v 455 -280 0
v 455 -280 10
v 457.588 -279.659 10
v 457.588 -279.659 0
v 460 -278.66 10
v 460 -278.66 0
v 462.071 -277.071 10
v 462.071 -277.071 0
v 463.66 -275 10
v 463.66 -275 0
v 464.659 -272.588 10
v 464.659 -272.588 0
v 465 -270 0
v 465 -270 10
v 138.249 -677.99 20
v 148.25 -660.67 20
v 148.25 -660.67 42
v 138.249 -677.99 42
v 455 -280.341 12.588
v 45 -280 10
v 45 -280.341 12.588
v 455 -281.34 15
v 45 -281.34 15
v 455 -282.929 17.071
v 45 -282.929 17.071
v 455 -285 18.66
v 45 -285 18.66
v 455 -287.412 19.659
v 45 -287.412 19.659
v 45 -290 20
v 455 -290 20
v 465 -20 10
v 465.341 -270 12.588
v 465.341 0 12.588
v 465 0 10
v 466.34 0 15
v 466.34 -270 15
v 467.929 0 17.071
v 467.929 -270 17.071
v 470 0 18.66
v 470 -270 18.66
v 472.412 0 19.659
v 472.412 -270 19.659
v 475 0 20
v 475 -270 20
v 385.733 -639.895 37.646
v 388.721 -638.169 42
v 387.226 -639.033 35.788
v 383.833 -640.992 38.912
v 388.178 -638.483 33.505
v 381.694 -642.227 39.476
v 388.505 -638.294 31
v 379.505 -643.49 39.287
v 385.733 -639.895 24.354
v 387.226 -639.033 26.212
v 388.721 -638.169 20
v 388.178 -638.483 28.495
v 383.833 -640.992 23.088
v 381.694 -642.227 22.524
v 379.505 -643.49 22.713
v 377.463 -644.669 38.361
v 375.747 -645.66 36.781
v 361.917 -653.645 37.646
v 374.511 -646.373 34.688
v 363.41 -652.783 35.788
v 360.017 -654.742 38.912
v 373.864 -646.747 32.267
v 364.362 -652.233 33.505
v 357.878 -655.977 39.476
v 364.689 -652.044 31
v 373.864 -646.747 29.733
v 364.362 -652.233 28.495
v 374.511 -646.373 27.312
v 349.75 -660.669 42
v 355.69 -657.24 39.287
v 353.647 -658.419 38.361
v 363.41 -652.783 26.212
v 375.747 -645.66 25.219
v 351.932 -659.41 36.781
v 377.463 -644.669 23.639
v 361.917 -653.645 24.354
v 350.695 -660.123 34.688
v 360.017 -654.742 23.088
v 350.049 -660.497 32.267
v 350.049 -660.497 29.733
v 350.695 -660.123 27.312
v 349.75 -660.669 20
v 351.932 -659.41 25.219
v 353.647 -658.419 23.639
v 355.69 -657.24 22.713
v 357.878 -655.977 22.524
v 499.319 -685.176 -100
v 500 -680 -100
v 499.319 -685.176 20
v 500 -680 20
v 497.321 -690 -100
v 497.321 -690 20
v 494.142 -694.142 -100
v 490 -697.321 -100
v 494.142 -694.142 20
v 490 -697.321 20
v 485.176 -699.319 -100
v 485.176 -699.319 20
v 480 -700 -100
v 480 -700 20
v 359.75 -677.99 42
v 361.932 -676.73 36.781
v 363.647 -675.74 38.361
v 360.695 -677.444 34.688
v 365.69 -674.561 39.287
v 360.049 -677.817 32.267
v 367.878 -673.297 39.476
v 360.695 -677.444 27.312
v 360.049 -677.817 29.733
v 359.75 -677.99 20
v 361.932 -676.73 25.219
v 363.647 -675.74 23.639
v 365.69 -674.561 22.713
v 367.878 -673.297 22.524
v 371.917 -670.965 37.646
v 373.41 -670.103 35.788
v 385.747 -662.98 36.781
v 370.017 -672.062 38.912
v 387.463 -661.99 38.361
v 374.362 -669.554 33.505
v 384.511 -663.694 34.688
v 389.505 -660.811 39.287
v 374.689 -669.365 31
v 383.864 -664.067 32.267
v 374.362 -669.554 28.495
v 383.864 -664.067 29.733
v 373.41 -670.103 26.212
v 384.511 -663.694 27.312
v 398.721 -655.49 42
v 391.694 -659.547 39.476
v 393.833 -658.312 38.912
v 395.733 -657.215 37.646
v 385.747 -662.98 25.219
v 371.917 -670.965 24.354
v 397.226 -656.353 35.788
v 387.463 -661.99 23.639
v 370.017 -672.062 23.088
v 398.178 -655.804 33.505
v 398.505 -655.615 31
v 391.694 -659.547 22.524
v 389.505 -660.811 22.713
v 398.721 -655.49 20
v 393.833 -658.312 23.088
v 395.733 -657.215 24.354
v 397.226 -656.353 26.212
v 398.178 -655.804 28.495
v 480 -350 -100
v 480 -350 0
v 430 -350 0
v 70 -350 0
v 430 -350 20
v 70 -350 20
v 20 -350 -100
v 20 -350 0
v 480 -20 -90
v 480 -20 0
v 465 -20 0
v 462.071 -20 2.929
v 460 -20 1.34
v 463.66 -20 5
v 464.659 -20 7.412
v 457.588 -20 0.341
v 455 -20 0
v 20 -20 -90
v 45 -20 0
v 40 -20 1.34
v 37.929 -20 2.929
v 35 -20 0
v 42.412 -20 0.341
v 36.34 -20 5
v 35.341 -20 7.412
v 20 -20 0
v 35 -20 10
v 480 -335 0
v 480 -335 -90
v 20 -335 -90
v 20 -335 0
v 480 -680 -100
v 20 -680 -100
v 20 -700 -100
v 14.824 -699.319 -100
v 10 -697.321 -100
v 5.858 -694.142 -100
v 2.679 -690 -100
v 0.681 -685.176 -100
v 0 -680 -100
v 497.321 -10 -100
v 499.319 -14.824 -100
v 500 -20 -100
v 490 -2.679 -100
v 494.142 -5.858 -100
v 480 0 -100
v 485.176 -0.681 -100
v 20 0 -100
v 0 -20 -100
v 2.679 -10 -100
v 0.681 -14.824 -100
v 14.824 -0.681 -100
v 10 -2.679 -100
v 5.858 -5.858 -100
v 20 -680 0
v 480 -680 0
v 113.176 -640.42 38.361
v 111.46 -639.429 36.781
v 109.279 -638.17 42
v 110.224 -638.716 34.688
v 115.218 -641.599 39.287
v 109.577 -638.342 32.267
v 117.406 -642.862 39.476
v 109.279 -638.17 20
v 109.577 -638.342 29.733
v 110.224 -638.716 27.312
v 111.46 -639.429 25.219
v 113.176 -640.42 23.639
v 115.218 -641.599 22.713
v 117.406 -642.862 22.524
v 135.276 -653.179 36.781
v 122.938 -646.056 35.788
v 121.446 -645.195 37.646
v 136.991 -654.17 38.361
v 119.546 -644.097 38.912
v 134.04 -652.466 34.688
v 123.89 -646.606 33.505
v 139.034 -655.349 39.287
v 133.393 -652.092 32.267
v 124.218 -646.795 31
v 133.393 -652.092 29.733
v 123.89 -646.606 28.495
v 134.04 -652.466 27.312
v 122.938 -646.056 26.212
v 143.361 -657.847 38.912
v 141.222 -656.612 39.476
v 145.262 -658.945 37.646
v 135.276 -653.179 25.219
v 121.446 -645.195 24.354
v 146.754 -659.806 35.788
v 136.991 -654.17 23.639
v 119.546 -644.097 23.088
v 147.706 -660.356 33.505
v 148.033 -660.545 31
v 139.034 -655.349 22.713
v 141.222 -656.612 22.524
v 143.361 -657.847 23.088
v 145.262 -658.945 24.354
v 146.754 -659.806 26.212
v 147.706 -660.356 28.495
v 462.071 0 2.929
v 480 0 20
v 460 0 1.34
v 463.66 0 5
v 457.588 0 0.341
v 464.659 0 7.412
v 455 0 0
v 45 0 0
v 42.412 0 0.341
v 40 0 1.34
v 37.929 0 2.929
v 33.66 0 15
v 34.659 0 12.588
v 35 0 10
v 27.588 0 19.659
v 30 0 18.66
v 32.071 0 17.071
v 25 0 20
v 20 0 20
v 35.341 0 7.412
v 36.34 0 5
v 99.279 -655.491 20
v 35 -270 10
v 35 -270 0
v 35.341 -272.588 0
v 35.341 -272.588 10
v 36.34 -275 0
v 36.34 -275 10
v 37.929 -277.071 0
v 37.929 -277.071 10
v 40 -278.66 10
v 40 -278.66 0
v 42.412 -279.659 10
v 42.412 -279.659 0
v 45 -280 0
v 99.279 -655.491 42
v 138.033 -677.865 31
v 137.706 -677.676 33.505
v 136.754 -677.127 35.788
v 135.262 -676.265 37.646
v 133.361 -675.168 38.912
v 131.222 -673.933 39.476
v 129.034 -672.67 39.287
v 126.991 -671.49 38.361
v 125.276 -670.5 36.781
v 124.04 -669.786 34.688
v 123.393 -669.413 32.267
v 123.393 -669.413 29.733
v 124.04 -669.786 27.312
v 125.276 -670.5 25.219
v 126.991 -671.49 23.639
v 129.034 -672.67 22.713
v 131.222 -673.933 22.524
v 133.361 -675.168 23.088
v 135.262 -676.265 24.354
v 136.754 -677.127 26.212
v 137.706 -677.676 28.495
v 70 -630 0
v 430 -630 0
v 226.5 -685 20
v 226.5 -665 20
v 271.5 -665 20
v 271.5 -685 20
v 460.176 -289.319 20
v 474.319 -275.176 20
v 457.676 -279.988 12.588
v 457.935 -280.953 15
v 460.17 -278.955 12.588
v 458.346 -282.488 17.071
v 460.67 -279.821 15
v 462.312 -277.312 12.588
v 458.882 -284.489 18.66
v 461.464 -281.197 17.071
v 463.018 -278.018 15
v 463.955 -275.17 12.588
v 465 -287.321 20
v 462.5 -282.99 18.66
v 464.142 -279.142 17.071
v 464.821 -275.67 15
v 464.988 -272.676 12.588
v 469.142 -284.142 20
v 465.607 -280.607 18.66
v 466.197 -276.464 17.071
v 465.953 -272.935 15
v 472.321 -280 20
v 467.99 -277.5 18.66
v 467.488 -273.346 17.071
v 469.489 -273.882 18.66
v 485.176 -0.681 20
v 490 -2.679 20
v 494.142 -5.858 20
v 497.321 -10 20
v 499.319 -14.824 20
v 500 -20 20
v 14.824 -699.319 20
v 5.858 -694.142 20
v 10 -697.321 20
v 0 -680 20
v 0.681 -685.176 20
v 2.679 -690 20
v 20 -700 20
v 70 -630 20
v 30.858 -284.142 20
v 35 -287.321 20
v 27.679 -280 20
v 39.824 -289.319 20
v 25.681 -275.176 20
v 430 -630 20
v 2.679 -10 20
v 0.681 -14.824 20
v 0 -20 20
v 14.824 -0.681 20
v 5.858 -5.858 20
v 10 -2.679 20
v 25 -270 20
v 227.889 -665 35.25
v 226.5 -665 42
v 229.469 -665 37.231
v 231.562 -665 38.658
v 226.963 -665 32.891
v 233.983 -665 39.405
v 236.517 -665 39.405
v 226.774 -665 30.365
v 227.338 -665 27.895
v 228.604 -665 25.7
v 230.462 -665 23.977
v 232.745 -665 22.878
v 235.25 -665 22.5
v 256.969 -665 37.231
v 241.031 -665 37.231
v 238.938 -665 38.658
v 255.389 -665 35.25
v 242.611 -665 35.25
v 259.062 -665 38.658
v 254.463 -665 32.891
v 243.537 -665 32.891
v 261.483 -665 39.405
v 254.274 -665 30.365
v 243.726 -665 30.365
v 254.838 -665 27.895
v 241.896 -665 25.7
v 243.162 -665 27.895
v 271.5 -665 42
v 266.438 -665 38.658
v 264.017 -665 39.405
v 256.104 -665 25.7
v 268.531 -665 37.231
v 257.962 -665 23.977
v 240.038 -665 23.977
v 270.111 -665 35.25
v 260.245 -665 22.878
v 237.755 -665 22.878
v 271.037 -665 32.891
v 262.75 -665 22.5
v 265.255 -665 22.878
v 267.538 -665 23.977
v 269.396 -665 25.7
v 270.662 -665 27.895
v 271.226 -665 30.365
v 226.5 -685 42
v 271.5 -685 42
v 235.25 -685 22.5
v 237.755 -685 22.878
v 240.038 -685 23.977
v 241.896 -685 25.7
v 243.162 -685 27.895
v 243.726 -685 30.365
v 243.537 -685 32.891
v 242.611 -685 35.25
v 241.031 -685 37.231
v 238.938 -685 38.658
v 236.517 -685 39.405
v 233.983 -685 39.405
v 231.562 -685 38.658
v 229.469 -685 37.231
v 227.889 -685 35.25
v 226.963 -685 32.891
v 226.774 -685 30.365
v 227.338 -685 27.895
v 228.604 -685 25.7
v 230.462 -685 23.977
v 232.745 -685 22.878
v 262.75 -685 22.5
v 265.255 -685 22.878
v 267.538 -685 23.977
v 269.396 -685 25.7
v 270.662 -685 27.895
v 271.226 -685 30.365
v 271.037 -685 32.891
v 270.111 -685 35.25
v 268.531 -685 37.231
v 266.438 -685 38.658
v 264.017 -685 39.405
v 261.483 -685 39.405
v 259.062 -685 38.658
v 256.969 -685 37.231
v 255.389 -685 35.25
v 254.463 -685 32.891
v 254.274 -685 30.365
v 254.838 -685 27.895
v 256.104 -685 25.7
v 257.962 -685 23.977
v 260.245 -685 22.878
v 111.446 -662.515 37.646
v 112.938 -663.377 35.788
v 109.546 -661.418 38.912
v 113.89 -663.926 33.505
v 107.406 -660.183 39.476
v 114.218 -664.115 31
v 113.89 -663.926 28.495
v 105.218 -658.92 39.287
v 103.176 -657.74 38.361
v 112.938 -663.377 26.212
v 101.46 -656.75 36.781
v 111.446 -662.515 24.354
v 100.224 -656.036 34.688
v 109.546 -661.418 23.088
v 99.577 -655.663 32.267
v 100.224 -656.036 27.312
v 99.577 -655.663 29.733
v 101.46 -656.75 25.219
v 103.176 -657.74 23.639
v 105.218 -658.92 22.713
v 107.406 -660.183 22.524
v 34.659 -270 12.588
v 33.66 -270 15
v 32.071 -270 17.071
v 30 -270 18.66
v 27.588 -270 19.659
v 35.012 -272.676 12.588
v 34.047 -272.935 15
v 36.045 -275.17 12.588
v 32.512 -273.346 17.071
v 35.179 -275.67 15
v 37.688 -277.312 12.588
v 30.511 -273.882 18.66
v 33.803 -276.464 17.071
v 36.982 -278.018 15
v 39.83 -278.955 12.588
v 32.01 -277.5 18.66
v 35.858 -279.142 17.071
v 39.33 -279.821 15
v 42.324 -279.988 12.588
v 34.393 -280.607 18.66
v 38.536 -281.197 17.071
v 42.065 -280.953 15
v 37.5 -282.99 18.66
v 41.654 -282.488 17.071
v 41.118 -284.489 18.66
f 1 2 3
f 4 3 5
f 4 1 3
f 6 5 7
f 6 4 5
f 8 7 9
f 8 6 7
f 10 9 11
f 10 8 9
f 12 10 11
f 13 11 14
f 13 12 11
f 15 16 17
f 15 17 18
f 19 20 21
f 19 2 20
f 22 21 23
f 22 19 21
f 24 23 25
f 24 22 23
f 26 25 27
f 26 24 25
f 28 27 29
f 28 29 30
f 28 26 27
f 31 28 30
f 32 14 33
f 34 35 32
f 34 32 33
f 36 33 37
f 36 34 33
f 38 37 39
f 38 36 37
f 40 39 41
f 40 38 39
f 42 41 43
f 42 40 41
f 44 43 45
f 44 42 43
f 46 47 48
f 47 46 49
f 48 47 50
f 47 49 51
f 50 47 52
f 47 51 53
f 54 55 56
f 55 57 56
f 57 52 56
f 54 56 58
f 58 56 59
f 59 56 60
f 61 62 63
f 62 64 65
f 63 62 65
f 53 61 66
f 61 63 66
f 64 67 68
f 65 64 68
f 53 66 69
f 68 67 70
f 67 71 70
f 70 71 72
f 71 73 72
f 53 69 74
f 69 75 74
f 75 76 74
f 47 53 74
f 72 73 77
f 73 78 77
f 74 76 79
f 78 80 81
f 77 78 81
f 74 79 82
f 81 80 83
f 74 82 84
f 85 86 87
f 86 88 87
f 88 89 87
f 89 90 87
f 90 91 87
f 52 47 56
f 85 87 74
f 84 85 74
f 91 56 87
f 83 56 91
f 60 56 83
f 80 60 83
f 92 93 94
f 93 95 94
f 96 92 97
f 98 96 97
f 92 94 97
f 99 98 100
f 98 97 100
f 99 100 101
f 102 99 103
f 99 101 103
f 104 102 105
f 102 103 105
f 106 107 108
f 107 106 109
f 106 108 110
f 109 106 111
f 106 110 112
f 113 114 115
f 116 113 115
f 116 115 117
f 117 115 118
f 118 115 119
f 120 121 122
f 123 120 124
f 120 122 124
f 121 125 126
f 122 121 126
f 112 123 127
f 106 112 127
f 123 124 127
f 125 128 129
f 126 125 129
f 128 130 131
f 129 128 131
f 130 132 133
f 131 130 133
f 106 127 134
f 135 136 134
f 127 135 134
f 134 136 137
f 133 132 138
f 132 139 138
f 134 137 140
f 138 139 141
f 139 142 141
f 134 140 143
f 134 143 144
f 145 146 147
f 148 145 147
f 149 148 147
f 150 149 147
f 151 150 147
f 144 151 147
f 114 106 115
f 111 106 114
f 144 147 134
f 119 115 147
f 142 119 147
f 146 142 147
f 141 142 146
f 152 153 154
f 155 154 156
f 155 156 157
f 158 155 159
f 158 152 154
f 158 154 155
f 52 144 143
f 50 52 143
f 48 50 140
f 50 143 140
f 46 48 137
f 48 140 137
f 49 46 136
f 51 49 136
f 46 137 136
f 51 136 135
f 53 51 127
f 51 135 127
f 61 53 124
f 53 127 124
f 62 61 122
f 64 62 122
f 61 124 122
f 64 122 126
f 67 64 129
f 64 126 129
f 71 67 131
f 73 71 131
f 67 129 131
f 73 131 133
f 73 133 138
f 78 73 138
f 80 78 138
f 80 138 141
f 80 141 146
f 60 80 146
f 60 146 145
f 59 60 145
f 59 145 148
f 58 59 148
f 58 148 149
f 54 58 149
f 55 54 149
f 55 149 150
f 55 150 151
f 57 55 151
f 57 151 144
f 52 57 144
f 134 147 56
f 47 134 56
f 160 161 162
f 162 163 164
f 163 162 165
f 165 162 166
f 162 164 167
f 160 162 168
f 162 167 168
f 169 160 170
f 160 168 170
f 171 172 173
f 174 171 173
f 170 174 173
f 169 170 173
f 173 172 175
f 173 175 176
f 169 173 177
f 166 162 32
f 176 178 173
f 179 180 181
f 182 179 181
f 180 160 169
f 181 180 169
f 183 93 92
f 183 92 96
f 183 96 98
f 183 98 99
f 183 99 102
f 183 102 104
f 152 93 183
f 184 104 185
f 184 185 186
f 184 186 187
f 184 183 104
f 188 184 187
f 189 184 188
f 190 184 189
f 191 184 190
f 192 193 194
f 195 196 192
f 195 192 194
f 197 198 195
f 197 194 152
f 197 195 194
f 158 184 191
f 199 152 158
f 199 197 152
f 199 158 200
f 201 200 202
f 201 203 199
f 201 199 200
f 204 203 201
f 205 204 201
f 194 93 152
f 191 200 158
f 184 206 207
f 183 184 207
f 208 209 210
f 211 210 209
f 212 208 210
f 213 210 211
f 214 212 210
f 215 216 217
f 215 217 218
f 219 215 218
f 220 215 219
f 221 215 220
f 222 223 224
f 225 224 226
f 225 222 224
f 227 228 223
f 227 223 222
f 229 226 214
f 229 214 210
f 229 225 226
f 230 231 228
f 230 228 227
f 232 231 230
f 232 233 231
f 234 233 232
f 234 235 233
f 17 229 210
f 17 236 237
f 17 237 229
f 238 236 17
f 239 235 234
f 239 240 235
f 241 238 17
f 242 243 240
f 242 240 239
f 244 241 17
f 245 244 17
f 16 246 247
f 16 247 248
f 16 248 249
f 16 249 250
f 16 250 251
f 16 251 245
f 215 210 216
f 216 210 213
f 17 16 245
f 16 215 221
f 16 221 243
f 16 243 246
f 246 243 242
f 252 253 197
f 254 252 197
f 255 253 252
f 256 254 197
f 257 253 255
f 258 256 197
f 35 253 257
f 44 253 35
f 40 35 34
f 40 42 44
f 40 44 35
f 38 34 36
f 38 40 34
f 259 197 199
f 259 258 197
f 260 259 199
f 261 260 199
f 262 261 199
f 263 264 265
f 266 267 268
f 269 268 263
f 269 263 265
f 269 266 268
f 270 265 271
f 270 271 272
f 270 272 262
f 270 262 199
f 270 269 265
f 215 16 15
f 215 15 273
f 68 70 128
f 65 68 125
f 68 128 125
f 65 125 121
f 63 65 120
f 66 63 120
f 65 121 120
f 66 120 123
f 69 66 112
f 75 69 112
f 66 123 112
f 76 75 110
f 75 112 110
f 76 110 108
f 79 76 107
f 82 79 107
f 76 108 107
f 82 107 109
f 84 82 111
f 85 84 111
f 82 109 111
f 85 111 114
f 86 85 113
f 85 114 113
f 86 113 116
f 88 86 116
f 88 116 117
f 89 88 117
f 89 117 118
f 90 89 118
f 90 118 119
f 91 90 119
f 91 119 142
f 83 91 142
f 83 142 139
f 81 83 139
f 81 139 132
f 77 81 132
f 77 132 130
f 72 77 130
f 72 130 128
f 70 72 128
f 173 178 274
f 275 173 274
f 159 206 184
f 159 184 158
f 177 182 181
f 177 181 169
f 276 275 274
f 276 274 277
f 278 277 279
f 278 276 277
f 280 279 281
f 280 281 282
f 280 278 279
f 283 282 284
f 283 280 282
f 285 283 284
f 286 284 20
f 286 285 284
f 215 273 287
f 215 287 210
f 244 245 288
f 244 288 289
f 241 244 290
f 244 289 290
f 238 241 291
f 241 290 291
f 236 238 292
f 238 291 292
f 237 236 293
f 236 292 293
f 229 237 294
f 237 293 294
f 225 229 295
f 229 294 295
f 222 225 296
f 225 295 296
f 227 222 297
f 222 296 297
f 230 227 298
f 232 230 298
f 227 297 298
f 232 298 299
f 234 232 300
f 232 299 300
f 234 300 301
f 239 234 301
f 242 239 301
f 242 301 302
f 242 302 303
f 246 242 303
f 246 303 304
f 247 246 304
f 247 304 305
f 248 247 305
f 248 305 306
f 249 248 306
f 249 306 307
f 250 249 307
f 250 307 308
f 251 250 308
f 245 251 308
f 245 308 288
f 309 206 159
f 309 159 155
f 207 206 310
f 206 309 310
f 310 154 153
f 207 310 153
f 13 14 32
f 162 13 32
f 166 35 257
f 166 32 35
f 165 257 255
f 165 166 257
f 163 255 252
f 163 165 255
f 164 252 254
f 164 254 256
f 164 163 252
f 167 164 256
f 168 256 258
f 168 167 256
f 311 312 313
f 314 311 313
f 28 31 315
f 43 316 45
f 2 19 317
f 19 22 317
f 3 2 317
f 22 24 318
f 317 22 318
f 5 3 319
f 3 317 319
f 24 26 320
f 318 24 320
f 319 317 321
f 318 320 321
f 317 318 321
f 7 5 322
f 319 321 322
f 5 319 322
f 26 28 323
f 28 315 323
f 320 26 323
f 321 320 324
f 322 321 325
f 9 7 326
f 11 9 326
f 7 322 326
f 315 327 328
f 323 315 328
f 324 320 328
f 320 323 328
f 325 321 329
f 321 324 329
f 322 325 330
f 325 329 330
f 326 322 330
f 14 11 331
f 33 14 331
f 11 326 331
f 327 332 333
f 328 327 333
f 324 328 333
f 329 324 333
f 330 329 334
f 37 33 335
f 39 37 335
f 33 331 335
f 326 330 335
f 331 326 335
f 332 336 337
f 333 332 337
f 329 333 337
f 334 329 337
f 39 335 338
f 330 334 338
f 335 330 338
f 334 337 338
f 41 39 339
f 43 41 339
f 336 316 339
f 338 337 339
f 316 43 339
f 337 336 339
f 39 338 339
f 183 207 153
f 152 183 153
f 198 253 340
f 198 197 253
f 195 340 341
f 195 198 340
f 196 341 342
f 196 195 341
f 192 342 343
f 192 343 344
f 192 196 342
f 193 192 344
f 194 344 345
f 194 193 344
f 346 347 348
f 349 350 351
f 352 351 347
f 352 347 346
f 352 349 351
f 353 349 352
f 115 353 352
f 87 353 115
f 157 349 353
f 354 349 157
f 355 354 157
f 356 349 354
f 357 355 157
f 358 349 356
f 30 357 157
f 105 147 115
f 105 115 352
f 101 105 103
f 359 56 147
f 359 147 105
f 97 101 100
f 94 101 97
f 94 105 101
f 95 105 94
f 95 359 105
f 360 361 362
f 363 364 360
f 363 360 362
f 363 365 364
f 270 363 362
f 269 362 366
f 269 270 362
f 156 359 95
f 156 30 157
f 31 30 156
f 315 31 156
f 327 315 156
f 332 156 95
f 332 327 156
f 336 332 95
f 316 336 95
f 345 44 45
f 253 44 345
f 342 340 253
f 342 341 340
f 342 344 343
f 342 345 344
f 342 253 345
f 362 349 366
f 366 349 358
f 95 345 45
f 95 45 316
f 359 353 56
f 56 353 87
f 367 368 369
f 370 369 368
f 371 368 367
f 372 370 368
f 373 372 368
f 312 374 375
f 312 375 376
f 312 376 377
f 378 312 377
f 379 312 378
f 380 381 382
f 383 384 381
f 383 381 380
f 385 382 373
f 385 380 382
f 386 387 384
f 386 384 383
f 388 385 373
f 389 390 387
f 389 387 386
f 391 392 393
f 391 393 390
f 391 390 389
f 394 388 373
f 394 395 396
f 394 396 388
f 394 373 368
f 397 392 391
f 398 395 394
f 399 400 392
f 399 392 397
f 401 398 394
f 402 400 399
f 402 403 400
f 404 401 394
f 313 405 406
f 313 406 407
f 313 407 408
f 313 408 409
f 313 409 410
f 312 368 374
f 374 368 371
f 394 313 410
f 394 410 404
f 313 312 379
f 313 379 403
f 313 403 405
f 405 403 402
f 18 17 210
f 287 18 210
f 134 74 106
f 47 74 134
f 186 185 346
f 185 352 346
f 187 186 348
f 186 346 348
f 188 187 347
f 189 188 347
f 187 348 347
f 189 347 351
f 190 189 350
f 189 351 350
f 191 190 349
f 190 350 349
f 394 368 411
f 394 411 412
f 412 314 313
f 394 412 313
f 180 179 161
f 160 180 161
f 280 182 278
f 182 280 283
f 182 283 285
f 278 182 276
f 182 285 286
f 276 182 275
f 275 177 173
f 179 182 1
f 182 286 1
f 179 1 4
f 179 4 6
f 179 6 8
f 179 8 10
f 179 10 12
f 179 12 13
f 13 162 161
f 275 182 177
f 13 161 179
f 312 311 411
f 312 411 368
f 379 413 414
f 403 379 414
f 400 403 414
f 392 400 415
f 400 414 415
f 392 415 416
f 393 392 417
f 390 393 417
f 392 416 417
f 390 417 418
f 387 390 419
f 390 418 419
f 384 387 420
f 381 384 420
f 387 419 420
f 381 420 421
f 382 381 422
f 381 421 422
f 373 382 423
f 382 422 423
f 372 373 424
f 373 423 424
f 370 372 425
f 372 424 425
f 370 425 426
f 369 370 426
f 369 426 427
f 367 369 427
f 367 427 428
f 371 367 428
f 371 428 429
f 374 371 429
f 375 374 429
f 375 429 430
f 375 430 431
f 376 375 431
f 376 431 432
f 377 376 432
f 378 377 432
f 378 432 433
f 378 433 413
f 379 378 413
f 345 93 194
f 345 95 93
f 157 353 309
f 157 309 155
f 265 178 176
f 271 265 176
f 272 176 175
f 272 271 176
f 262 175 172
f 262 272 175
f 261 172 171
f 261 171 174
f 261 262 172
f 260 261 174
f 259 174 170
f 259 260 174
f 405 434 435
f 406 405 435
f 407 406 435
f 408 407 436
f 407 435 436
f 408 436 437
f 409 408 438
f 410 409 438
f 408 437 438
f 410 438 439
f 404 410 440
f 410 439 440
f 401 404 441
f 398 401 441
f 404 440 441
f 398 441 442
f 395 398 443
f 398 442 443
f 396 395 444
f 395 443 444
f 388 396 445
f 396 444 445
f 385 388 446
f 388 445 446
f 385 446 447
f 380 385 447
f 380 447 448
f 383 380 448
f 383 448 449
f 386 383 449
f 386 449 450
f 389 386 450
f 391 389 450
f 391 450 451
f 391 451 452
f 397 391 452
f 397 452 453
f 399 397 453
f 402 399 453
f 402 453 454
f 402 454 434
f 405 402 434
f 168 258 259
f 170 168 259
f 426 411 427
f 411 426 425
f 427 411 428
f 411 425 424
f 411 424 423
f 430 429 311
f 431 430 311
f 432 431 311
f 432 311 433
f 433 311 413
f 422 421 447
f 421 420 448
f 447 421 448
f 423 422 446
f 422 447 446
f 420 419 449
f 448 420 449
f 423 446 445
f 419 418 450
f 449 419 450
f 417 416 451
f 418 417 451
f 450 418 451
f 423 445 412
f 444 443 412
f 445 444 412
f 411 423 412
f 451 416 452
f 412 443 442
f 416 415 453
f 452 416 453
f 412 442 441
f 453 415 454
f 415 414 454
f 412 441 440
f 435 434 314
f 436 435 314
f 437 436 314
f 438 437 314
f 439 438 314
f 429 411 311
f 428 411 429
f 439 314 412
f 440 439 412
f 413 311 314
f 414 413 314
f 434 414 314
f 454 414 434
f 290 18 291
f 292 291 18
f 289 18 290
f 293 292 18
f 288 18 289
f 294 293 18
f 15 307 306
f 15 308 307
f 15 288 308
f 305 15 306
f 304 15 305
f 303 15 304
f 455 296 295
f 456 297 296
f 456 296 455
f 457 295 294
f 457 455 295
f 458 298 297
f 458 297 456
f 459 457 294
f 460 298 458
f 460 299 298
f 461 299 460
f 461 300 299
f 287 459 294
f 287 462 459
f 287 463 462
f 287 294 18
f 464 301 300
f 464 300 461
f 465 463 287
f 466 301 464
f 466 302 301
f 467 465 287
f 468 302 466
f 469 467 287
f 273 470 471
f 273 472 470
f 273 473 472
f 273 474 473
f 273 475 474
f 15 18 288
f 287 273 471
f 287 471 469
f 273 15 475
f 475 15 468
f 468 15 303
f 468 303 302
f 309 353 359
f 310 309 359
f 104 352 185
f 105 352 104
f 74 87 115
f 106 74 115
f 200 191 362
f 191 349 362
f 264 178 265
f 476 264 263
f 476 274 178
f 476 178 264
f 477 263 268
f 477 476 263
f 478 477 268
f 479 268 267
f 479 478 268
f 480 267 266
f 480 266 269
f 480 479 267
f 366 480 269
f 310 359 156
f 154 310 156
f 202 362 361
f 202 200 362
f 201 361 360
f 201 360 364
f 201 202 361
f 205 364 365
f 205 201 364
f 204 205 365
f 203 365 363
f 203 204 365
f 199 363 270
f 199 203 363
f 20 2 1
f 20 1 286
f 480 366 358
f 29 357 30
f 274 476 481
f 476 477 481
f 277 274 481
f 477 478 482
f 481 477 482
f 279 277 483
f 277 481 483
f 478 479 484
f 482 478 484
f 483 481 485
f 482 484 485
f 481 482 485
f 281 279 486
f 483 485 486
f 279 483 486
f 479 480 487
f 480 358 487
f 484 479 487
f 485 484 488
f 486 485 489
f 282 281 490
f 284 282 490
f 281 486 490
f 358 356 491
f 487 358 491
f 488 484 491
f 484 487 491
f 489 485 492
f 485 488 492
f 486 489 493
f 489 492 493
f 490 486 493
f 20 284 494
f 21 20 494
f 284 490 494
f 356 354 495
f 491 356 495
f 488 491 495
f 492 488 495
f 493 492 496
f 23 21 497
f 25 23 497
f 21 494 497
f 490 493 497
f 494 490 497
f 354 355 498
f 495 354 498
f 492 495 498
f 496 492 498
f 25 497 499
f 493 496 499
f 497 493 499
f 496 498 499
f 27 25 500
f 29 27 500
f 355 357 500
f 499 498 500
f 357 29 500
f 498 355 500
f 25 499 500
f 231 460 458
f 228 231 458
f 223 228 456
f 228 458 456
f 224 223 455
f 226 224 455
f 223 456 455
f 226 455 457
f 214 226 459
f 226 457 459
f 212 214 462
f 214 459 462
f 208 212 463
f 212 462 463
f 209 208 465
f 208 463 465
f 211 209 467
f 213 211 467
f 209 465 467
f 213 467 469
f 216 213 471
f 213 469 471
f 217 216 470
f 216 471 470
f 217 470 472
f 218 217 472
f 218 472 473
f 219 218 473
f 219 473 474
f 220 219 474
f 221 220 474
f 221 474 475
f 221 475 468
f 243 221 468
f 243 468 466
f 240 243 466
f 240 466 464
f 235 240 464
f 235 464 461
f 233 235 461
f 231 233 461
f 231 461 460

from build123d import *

# Parameters (mm, degrees)
SCHIZZO1_W                     = 500
SCHIZZO1_H                     = 700
ESTRUSIONE_ESTRUSIONE4_DEPTH   = 20
SCHIZZO1_4_W                   = 500
SCHIZZO1_4_H                   = 700
SCHIZZO1_4_W_2                 = 460
SCHIZZO1_4_H_2                 = 660
ESTRUSIONE_ESTRUSIONE5_DEPTH   = 100
ESTRUSIONE_ESTRUSIONE6_START   = 20
ESTRUSIONE_ESTRUSIONE6_DEPTH   = 22
SCHIZZO2_W                     = 45
SCHIZZO2_H                     = 20
ESTRUSIONE_ESTRUSIONE6_2_DEPTH = 22
ESTRUSIONE_ESTRUSIONE7_START   = 20
ESTRUSIONE_ESTRUSIONE7_DEPTH   = 22
SCHIZZO6_R                     = 8.5
TAGLIO_ESTRUSIONE1_DEPTH       = 22
SCHIZZO7_R                     = 8.5
TAGLIO_ESTRUSIONE2_DEPTH       = 22
SCHIZZO8_R                     = 8.5
TAGLIO_ESTRUSIONE3_DEPTH       = 22
SCHIZZO10_W                    = 360
SCHIZZO10_H                    = 280
TAGLIO_ESTRUSIONE4_DEPTH       = 22
RACCORDO1_R                    = 20
RACCORDO2_R                    = 20
RACCORDO3_R                    = 20
RACCORDO4_R                    = 20
SCHIZZO11_W                    = 460
SCHIZZO11_H                    = 15
ESTRUSIONE_ESTRUSIONE8_DEPTH   = 100
SCHIZZO11_3_W                  = 460
SCHIZZO11_3_H                  = 315
ESTRUSIONE_ESTRUSIONE9_DEPTH   = 10
TAGLIO_ESTRUSIONE5_DEPTH       = 20
RACCORDO5_R                    = 10
RACCORDO6_R                    = 10
RACCORDO7_R                    = 10
RACCORDO8_R                    = 10
RACCORDO9_R                    = 10


with BuildPart() as part:
    # Schizzo1 → Estrusione-Estrusione4 (new body)
    with BuildSketch(Plane.XY):
        with Locations((250, -350)):
            Rectangle(SCHIZZO1_W, SCHIZZO1_H)
    extrude(amount=ESTRUSIONE_ESTRUSIONE4_DEPTH)

    # Schizzo1<4> → Estrusione-Estrusione5 (add)
    with BuildSketch(Plane.XY):
        with Locations((250, -350)):
            Rectangle(SCHIZZO1_4_W, SCHIZZO1_4_H)
        with Locations((250, -350)):
            Rectangle(SCHIZZO1_4_W_2, SCHIZZO1_4_H_2, mode=Mode.SUBTRACT)
    extrude(amount=-ESTRUSIONE_ESTRUSIONE5_DEPTH)

    # Schizzo2<3> → Estrusione-Estrusione7 (add)
    with BuildSketch(Plane.XY.offset(ESTRUSIONE_ESTRUSIONE7_START)):
        Polygon((359.75, -677.989883085), (398.72114317, -655.489883085), (388.72114317, -638.169375009), (349.75, -660.669375009), align=None)
    extrude(amount=ESTRUSIONE_ESTRUSIONE7_DEPTH)

    # Schizzo8 → Taglio-Estrusione3 (cut)
    with BuildSketch(Plane(origin=(383.51573113, -664.26873182, 0), x_dir=(0.8660254037844405, 0.49999999999999684, 0), z_dir=(0.49999999999999684, -0.8660254037844405, 0))):
        with Locations((-18.692302531, 31)):
            Circle(SCHIZZO8_R)
        with Locations((8.807697469, 31)):
            Circle(SCHIZZO8_R)
    extrude(amount=-TAGLIO_ESTRUSIONE3_DEPTH, mode=Mode.SUBTRACT)

    # Schizzo10 → Taglio-Estrusione4 (cut)
    with BuildSketch(Plane.XY.offset(20)):
        with Locations((250, -490)):
            Rectangle(SCHIZZO10_W, SCHIZZO10_H)
    extrude(amount=-TAGLIO_ESTRUSIONE4_DEPTH, mode=Mode.SUBTRACT)

    # Raccordo1
    raccordo1_edges = [part.edges().sort_by_distance(p)[0] for p in [
        (0, 0, -40),
    ]]
    fillet(raccordo1_edges, radius=RACCORDO1_R)

    # Raccordo2
    raccordo2_edges = [part.edges().sort_by_distance(p)[0] for p in [
        (500, 0, -40),
    ]]
    fillet(raccordo2_edges, radius=RACCORDO2_R)

    # Raccordo3
    raccordo3_edges = [part.edges().sort_by_distance(p)[0] for p in [
        (500, -700, -40),
    ]]
    fillet(raccordo3_edges, radius=RACCORDO3_R)

    # Raccordo4
    raccordo4_edges = [part.edges().sort_by_distance(p)[0] for p in [
        (0, -700, -40),
    ]]
    fillet(raccordo4_edges, radius=RACCORDO4_R)

    # Schizzo11 → Estrusione-Estrusione8 (add)
    with BuildSketch(Plane(origin=(0, 0, -100), x_dir=(-1, 0, 0), z_dir=(0, 0, -1))):
        with Locations((-250, -342.5)):
            Rectangle(SCHIZZO11_W, SCHIZZO11_H)
    extrude(amount=-ESTRUSIONE_ESTRUSIONE8_DEPTH)

    # Schizzo11<3> → Estrusione-Estrusione9 (add)
    with BuildSketch(Plane(origin=(0, 0, -100), x_dir=(-1, 0, 0), z_dir=(0, 0, -1))):
        with Locations((-250, -177.5)):
            Rectangle(SCHIZZO11_3_W, SCHIZZO11_3_H)
    extrude(amount=-ESTRUSIONE_ESTRUSIONE9_DEPTH)

    # Schizzo12 → Taglio-Estrusione5 (cut)
    with BuildSketch(Plane.XY.offset(20)):
        Polygon((35, -35), (35, 0), (465, 0), (465, -35), (465, -280), (35, -280), align=None)
    extrude(amount=-TAGLIO_ESTRUSIONE5_DEPTH, mode=Mode.SUBTRACT)

    # Raccordo5
    raccordo5_edges = [part.edges().sort_by_distance(p)[0] for p in [
        (35, -280, 10),
    ]]
    fillet(raccordo5_edges, radius=RACCORDO5_R)

    # Raccordo6
    raccordo6_edges = [part.edges().sort_by_distance(p)[0] for p in [
        (465, -280, 10),
    ]]
    fillet(raccordo6_edges, radius=RACCORDO6_R)

    # Raccordo7
    # the kernel refuses this fillet: 10 mm, written as the material it adds along each edge
    with BuildSketch(Plane(origin=(465, -20, 0), x_dir=(0, 0, 1), z_dir=(0, 1, 0))) as raccordo7_piece_1:
        with BuildLine():
            CenterArc((RACCORDO7_R, -RACCORDO7_R), RACCORDO7_R, 90, 90)
            Line((0, -RACCORDO7_R), (0, 0))
            Line((0, 0), (RACCORDO7_R, 0))
        make_face()
    extrude(amount=20)

    # Raccordo8
    # the kernel refuses this fillet: 10 mm, written as the material it adds along each edge
    with BuildSketch(Plane(origin=(35, 0, 0), x_dir=(1, 0, 0), z_dir=(0, -1, 0))) as raccordo8_piece_1:
        with BuildLine():
            CenterArc((RACCORDO8_R, RACCORDO8_R), RACCORDO8_R, 180, 90)
            Line((0, RACCORDO8_R), (0, 0))
            Line((0, 0), (RACCORDO8_R, 0))
        make_face()
    extrude(amount=20)

    # Raccordo9
    raccordo9_edges = [part.edges().sort_by_distance(p)[0] for p in [
        (35, -135, 20),
        (250, -280, 20),
        (37.928932188, -277.071067812, 20),
        (465, -135, 20),
        (462.071067812, -277.071067812, 20),
    ]]
    fillet(raccordo9_edges, radius=RACCORDO9_R)


with BuildPart() as body_2:
    # Schizzo2 → Estrusione-Estrusione6 (new body)
    with BuildSketch(Plane.XY.offset(ESTRUSIONE_ESTRUSIONE6_START)):
        Polygon((148.250287501, -660.670038978), (138.249137563, -677.989883085), (99.279144353, -655.490547015), (109.279144331, -638.170038978), align=None)
    extrude(amount=ESTRUSIONE_ESTRUSIONE6_DEPTH)

    # Schizzo6 → Taglio-Estrusione1 (cut)
    with BuildSketch(Plane(origin=(-259.01594674, -448.628779724, 0), x_dir=(0.8660254037844389, -0.49999999999999967, 0), z_dir=(-0.49999999999999967, -0.8660254037844389, 0))):
        with Locations((422.472870653, 31)):
            Circle(SCHIZZO6_R)
        with Locations((449.972870653, 31)):
            Circle(SCHIZZO6_R)
    extrude(amount=-TAGLIO_ESTRUSIONE1_DEPTH, mode=Mode.SUBTRACT)


with BuildPart() as body_3:
    # Schizzo2 → Estrusione-Estrusione6 2 (new body)
    with BuildSketch(Plane.XY.offset(ESTRUSIONE_ESTRUSIONE6_START)):
        with Locations((249, -675)):
            Rectangle(SCHIZZO2_W, SCHIZZO2_H)
    extrude(amount=ESTRUSIONE_ESTRUSIONE6_2_DEPTH)

    # Schizzo7 → Taglio-Estrusione2 (cut)
    with BuildSketch(Plane.XZ.offset(685)):
        with Locations(Location((235.25, 31, 0), (0, 0, 270))):
            Circle(SCHIZZO7_R)
        with Locations(Location((262.75, 31, 0), (0, 0, 270))):
            Circle(SCHIZZO7_R)
    extrude(amount=-TAGLIO_ESTRUSIONE2_DEPTH, mode=Mode.SUBTRACT)


solid = Compound([part.part, body_2.part, body_3.part])
